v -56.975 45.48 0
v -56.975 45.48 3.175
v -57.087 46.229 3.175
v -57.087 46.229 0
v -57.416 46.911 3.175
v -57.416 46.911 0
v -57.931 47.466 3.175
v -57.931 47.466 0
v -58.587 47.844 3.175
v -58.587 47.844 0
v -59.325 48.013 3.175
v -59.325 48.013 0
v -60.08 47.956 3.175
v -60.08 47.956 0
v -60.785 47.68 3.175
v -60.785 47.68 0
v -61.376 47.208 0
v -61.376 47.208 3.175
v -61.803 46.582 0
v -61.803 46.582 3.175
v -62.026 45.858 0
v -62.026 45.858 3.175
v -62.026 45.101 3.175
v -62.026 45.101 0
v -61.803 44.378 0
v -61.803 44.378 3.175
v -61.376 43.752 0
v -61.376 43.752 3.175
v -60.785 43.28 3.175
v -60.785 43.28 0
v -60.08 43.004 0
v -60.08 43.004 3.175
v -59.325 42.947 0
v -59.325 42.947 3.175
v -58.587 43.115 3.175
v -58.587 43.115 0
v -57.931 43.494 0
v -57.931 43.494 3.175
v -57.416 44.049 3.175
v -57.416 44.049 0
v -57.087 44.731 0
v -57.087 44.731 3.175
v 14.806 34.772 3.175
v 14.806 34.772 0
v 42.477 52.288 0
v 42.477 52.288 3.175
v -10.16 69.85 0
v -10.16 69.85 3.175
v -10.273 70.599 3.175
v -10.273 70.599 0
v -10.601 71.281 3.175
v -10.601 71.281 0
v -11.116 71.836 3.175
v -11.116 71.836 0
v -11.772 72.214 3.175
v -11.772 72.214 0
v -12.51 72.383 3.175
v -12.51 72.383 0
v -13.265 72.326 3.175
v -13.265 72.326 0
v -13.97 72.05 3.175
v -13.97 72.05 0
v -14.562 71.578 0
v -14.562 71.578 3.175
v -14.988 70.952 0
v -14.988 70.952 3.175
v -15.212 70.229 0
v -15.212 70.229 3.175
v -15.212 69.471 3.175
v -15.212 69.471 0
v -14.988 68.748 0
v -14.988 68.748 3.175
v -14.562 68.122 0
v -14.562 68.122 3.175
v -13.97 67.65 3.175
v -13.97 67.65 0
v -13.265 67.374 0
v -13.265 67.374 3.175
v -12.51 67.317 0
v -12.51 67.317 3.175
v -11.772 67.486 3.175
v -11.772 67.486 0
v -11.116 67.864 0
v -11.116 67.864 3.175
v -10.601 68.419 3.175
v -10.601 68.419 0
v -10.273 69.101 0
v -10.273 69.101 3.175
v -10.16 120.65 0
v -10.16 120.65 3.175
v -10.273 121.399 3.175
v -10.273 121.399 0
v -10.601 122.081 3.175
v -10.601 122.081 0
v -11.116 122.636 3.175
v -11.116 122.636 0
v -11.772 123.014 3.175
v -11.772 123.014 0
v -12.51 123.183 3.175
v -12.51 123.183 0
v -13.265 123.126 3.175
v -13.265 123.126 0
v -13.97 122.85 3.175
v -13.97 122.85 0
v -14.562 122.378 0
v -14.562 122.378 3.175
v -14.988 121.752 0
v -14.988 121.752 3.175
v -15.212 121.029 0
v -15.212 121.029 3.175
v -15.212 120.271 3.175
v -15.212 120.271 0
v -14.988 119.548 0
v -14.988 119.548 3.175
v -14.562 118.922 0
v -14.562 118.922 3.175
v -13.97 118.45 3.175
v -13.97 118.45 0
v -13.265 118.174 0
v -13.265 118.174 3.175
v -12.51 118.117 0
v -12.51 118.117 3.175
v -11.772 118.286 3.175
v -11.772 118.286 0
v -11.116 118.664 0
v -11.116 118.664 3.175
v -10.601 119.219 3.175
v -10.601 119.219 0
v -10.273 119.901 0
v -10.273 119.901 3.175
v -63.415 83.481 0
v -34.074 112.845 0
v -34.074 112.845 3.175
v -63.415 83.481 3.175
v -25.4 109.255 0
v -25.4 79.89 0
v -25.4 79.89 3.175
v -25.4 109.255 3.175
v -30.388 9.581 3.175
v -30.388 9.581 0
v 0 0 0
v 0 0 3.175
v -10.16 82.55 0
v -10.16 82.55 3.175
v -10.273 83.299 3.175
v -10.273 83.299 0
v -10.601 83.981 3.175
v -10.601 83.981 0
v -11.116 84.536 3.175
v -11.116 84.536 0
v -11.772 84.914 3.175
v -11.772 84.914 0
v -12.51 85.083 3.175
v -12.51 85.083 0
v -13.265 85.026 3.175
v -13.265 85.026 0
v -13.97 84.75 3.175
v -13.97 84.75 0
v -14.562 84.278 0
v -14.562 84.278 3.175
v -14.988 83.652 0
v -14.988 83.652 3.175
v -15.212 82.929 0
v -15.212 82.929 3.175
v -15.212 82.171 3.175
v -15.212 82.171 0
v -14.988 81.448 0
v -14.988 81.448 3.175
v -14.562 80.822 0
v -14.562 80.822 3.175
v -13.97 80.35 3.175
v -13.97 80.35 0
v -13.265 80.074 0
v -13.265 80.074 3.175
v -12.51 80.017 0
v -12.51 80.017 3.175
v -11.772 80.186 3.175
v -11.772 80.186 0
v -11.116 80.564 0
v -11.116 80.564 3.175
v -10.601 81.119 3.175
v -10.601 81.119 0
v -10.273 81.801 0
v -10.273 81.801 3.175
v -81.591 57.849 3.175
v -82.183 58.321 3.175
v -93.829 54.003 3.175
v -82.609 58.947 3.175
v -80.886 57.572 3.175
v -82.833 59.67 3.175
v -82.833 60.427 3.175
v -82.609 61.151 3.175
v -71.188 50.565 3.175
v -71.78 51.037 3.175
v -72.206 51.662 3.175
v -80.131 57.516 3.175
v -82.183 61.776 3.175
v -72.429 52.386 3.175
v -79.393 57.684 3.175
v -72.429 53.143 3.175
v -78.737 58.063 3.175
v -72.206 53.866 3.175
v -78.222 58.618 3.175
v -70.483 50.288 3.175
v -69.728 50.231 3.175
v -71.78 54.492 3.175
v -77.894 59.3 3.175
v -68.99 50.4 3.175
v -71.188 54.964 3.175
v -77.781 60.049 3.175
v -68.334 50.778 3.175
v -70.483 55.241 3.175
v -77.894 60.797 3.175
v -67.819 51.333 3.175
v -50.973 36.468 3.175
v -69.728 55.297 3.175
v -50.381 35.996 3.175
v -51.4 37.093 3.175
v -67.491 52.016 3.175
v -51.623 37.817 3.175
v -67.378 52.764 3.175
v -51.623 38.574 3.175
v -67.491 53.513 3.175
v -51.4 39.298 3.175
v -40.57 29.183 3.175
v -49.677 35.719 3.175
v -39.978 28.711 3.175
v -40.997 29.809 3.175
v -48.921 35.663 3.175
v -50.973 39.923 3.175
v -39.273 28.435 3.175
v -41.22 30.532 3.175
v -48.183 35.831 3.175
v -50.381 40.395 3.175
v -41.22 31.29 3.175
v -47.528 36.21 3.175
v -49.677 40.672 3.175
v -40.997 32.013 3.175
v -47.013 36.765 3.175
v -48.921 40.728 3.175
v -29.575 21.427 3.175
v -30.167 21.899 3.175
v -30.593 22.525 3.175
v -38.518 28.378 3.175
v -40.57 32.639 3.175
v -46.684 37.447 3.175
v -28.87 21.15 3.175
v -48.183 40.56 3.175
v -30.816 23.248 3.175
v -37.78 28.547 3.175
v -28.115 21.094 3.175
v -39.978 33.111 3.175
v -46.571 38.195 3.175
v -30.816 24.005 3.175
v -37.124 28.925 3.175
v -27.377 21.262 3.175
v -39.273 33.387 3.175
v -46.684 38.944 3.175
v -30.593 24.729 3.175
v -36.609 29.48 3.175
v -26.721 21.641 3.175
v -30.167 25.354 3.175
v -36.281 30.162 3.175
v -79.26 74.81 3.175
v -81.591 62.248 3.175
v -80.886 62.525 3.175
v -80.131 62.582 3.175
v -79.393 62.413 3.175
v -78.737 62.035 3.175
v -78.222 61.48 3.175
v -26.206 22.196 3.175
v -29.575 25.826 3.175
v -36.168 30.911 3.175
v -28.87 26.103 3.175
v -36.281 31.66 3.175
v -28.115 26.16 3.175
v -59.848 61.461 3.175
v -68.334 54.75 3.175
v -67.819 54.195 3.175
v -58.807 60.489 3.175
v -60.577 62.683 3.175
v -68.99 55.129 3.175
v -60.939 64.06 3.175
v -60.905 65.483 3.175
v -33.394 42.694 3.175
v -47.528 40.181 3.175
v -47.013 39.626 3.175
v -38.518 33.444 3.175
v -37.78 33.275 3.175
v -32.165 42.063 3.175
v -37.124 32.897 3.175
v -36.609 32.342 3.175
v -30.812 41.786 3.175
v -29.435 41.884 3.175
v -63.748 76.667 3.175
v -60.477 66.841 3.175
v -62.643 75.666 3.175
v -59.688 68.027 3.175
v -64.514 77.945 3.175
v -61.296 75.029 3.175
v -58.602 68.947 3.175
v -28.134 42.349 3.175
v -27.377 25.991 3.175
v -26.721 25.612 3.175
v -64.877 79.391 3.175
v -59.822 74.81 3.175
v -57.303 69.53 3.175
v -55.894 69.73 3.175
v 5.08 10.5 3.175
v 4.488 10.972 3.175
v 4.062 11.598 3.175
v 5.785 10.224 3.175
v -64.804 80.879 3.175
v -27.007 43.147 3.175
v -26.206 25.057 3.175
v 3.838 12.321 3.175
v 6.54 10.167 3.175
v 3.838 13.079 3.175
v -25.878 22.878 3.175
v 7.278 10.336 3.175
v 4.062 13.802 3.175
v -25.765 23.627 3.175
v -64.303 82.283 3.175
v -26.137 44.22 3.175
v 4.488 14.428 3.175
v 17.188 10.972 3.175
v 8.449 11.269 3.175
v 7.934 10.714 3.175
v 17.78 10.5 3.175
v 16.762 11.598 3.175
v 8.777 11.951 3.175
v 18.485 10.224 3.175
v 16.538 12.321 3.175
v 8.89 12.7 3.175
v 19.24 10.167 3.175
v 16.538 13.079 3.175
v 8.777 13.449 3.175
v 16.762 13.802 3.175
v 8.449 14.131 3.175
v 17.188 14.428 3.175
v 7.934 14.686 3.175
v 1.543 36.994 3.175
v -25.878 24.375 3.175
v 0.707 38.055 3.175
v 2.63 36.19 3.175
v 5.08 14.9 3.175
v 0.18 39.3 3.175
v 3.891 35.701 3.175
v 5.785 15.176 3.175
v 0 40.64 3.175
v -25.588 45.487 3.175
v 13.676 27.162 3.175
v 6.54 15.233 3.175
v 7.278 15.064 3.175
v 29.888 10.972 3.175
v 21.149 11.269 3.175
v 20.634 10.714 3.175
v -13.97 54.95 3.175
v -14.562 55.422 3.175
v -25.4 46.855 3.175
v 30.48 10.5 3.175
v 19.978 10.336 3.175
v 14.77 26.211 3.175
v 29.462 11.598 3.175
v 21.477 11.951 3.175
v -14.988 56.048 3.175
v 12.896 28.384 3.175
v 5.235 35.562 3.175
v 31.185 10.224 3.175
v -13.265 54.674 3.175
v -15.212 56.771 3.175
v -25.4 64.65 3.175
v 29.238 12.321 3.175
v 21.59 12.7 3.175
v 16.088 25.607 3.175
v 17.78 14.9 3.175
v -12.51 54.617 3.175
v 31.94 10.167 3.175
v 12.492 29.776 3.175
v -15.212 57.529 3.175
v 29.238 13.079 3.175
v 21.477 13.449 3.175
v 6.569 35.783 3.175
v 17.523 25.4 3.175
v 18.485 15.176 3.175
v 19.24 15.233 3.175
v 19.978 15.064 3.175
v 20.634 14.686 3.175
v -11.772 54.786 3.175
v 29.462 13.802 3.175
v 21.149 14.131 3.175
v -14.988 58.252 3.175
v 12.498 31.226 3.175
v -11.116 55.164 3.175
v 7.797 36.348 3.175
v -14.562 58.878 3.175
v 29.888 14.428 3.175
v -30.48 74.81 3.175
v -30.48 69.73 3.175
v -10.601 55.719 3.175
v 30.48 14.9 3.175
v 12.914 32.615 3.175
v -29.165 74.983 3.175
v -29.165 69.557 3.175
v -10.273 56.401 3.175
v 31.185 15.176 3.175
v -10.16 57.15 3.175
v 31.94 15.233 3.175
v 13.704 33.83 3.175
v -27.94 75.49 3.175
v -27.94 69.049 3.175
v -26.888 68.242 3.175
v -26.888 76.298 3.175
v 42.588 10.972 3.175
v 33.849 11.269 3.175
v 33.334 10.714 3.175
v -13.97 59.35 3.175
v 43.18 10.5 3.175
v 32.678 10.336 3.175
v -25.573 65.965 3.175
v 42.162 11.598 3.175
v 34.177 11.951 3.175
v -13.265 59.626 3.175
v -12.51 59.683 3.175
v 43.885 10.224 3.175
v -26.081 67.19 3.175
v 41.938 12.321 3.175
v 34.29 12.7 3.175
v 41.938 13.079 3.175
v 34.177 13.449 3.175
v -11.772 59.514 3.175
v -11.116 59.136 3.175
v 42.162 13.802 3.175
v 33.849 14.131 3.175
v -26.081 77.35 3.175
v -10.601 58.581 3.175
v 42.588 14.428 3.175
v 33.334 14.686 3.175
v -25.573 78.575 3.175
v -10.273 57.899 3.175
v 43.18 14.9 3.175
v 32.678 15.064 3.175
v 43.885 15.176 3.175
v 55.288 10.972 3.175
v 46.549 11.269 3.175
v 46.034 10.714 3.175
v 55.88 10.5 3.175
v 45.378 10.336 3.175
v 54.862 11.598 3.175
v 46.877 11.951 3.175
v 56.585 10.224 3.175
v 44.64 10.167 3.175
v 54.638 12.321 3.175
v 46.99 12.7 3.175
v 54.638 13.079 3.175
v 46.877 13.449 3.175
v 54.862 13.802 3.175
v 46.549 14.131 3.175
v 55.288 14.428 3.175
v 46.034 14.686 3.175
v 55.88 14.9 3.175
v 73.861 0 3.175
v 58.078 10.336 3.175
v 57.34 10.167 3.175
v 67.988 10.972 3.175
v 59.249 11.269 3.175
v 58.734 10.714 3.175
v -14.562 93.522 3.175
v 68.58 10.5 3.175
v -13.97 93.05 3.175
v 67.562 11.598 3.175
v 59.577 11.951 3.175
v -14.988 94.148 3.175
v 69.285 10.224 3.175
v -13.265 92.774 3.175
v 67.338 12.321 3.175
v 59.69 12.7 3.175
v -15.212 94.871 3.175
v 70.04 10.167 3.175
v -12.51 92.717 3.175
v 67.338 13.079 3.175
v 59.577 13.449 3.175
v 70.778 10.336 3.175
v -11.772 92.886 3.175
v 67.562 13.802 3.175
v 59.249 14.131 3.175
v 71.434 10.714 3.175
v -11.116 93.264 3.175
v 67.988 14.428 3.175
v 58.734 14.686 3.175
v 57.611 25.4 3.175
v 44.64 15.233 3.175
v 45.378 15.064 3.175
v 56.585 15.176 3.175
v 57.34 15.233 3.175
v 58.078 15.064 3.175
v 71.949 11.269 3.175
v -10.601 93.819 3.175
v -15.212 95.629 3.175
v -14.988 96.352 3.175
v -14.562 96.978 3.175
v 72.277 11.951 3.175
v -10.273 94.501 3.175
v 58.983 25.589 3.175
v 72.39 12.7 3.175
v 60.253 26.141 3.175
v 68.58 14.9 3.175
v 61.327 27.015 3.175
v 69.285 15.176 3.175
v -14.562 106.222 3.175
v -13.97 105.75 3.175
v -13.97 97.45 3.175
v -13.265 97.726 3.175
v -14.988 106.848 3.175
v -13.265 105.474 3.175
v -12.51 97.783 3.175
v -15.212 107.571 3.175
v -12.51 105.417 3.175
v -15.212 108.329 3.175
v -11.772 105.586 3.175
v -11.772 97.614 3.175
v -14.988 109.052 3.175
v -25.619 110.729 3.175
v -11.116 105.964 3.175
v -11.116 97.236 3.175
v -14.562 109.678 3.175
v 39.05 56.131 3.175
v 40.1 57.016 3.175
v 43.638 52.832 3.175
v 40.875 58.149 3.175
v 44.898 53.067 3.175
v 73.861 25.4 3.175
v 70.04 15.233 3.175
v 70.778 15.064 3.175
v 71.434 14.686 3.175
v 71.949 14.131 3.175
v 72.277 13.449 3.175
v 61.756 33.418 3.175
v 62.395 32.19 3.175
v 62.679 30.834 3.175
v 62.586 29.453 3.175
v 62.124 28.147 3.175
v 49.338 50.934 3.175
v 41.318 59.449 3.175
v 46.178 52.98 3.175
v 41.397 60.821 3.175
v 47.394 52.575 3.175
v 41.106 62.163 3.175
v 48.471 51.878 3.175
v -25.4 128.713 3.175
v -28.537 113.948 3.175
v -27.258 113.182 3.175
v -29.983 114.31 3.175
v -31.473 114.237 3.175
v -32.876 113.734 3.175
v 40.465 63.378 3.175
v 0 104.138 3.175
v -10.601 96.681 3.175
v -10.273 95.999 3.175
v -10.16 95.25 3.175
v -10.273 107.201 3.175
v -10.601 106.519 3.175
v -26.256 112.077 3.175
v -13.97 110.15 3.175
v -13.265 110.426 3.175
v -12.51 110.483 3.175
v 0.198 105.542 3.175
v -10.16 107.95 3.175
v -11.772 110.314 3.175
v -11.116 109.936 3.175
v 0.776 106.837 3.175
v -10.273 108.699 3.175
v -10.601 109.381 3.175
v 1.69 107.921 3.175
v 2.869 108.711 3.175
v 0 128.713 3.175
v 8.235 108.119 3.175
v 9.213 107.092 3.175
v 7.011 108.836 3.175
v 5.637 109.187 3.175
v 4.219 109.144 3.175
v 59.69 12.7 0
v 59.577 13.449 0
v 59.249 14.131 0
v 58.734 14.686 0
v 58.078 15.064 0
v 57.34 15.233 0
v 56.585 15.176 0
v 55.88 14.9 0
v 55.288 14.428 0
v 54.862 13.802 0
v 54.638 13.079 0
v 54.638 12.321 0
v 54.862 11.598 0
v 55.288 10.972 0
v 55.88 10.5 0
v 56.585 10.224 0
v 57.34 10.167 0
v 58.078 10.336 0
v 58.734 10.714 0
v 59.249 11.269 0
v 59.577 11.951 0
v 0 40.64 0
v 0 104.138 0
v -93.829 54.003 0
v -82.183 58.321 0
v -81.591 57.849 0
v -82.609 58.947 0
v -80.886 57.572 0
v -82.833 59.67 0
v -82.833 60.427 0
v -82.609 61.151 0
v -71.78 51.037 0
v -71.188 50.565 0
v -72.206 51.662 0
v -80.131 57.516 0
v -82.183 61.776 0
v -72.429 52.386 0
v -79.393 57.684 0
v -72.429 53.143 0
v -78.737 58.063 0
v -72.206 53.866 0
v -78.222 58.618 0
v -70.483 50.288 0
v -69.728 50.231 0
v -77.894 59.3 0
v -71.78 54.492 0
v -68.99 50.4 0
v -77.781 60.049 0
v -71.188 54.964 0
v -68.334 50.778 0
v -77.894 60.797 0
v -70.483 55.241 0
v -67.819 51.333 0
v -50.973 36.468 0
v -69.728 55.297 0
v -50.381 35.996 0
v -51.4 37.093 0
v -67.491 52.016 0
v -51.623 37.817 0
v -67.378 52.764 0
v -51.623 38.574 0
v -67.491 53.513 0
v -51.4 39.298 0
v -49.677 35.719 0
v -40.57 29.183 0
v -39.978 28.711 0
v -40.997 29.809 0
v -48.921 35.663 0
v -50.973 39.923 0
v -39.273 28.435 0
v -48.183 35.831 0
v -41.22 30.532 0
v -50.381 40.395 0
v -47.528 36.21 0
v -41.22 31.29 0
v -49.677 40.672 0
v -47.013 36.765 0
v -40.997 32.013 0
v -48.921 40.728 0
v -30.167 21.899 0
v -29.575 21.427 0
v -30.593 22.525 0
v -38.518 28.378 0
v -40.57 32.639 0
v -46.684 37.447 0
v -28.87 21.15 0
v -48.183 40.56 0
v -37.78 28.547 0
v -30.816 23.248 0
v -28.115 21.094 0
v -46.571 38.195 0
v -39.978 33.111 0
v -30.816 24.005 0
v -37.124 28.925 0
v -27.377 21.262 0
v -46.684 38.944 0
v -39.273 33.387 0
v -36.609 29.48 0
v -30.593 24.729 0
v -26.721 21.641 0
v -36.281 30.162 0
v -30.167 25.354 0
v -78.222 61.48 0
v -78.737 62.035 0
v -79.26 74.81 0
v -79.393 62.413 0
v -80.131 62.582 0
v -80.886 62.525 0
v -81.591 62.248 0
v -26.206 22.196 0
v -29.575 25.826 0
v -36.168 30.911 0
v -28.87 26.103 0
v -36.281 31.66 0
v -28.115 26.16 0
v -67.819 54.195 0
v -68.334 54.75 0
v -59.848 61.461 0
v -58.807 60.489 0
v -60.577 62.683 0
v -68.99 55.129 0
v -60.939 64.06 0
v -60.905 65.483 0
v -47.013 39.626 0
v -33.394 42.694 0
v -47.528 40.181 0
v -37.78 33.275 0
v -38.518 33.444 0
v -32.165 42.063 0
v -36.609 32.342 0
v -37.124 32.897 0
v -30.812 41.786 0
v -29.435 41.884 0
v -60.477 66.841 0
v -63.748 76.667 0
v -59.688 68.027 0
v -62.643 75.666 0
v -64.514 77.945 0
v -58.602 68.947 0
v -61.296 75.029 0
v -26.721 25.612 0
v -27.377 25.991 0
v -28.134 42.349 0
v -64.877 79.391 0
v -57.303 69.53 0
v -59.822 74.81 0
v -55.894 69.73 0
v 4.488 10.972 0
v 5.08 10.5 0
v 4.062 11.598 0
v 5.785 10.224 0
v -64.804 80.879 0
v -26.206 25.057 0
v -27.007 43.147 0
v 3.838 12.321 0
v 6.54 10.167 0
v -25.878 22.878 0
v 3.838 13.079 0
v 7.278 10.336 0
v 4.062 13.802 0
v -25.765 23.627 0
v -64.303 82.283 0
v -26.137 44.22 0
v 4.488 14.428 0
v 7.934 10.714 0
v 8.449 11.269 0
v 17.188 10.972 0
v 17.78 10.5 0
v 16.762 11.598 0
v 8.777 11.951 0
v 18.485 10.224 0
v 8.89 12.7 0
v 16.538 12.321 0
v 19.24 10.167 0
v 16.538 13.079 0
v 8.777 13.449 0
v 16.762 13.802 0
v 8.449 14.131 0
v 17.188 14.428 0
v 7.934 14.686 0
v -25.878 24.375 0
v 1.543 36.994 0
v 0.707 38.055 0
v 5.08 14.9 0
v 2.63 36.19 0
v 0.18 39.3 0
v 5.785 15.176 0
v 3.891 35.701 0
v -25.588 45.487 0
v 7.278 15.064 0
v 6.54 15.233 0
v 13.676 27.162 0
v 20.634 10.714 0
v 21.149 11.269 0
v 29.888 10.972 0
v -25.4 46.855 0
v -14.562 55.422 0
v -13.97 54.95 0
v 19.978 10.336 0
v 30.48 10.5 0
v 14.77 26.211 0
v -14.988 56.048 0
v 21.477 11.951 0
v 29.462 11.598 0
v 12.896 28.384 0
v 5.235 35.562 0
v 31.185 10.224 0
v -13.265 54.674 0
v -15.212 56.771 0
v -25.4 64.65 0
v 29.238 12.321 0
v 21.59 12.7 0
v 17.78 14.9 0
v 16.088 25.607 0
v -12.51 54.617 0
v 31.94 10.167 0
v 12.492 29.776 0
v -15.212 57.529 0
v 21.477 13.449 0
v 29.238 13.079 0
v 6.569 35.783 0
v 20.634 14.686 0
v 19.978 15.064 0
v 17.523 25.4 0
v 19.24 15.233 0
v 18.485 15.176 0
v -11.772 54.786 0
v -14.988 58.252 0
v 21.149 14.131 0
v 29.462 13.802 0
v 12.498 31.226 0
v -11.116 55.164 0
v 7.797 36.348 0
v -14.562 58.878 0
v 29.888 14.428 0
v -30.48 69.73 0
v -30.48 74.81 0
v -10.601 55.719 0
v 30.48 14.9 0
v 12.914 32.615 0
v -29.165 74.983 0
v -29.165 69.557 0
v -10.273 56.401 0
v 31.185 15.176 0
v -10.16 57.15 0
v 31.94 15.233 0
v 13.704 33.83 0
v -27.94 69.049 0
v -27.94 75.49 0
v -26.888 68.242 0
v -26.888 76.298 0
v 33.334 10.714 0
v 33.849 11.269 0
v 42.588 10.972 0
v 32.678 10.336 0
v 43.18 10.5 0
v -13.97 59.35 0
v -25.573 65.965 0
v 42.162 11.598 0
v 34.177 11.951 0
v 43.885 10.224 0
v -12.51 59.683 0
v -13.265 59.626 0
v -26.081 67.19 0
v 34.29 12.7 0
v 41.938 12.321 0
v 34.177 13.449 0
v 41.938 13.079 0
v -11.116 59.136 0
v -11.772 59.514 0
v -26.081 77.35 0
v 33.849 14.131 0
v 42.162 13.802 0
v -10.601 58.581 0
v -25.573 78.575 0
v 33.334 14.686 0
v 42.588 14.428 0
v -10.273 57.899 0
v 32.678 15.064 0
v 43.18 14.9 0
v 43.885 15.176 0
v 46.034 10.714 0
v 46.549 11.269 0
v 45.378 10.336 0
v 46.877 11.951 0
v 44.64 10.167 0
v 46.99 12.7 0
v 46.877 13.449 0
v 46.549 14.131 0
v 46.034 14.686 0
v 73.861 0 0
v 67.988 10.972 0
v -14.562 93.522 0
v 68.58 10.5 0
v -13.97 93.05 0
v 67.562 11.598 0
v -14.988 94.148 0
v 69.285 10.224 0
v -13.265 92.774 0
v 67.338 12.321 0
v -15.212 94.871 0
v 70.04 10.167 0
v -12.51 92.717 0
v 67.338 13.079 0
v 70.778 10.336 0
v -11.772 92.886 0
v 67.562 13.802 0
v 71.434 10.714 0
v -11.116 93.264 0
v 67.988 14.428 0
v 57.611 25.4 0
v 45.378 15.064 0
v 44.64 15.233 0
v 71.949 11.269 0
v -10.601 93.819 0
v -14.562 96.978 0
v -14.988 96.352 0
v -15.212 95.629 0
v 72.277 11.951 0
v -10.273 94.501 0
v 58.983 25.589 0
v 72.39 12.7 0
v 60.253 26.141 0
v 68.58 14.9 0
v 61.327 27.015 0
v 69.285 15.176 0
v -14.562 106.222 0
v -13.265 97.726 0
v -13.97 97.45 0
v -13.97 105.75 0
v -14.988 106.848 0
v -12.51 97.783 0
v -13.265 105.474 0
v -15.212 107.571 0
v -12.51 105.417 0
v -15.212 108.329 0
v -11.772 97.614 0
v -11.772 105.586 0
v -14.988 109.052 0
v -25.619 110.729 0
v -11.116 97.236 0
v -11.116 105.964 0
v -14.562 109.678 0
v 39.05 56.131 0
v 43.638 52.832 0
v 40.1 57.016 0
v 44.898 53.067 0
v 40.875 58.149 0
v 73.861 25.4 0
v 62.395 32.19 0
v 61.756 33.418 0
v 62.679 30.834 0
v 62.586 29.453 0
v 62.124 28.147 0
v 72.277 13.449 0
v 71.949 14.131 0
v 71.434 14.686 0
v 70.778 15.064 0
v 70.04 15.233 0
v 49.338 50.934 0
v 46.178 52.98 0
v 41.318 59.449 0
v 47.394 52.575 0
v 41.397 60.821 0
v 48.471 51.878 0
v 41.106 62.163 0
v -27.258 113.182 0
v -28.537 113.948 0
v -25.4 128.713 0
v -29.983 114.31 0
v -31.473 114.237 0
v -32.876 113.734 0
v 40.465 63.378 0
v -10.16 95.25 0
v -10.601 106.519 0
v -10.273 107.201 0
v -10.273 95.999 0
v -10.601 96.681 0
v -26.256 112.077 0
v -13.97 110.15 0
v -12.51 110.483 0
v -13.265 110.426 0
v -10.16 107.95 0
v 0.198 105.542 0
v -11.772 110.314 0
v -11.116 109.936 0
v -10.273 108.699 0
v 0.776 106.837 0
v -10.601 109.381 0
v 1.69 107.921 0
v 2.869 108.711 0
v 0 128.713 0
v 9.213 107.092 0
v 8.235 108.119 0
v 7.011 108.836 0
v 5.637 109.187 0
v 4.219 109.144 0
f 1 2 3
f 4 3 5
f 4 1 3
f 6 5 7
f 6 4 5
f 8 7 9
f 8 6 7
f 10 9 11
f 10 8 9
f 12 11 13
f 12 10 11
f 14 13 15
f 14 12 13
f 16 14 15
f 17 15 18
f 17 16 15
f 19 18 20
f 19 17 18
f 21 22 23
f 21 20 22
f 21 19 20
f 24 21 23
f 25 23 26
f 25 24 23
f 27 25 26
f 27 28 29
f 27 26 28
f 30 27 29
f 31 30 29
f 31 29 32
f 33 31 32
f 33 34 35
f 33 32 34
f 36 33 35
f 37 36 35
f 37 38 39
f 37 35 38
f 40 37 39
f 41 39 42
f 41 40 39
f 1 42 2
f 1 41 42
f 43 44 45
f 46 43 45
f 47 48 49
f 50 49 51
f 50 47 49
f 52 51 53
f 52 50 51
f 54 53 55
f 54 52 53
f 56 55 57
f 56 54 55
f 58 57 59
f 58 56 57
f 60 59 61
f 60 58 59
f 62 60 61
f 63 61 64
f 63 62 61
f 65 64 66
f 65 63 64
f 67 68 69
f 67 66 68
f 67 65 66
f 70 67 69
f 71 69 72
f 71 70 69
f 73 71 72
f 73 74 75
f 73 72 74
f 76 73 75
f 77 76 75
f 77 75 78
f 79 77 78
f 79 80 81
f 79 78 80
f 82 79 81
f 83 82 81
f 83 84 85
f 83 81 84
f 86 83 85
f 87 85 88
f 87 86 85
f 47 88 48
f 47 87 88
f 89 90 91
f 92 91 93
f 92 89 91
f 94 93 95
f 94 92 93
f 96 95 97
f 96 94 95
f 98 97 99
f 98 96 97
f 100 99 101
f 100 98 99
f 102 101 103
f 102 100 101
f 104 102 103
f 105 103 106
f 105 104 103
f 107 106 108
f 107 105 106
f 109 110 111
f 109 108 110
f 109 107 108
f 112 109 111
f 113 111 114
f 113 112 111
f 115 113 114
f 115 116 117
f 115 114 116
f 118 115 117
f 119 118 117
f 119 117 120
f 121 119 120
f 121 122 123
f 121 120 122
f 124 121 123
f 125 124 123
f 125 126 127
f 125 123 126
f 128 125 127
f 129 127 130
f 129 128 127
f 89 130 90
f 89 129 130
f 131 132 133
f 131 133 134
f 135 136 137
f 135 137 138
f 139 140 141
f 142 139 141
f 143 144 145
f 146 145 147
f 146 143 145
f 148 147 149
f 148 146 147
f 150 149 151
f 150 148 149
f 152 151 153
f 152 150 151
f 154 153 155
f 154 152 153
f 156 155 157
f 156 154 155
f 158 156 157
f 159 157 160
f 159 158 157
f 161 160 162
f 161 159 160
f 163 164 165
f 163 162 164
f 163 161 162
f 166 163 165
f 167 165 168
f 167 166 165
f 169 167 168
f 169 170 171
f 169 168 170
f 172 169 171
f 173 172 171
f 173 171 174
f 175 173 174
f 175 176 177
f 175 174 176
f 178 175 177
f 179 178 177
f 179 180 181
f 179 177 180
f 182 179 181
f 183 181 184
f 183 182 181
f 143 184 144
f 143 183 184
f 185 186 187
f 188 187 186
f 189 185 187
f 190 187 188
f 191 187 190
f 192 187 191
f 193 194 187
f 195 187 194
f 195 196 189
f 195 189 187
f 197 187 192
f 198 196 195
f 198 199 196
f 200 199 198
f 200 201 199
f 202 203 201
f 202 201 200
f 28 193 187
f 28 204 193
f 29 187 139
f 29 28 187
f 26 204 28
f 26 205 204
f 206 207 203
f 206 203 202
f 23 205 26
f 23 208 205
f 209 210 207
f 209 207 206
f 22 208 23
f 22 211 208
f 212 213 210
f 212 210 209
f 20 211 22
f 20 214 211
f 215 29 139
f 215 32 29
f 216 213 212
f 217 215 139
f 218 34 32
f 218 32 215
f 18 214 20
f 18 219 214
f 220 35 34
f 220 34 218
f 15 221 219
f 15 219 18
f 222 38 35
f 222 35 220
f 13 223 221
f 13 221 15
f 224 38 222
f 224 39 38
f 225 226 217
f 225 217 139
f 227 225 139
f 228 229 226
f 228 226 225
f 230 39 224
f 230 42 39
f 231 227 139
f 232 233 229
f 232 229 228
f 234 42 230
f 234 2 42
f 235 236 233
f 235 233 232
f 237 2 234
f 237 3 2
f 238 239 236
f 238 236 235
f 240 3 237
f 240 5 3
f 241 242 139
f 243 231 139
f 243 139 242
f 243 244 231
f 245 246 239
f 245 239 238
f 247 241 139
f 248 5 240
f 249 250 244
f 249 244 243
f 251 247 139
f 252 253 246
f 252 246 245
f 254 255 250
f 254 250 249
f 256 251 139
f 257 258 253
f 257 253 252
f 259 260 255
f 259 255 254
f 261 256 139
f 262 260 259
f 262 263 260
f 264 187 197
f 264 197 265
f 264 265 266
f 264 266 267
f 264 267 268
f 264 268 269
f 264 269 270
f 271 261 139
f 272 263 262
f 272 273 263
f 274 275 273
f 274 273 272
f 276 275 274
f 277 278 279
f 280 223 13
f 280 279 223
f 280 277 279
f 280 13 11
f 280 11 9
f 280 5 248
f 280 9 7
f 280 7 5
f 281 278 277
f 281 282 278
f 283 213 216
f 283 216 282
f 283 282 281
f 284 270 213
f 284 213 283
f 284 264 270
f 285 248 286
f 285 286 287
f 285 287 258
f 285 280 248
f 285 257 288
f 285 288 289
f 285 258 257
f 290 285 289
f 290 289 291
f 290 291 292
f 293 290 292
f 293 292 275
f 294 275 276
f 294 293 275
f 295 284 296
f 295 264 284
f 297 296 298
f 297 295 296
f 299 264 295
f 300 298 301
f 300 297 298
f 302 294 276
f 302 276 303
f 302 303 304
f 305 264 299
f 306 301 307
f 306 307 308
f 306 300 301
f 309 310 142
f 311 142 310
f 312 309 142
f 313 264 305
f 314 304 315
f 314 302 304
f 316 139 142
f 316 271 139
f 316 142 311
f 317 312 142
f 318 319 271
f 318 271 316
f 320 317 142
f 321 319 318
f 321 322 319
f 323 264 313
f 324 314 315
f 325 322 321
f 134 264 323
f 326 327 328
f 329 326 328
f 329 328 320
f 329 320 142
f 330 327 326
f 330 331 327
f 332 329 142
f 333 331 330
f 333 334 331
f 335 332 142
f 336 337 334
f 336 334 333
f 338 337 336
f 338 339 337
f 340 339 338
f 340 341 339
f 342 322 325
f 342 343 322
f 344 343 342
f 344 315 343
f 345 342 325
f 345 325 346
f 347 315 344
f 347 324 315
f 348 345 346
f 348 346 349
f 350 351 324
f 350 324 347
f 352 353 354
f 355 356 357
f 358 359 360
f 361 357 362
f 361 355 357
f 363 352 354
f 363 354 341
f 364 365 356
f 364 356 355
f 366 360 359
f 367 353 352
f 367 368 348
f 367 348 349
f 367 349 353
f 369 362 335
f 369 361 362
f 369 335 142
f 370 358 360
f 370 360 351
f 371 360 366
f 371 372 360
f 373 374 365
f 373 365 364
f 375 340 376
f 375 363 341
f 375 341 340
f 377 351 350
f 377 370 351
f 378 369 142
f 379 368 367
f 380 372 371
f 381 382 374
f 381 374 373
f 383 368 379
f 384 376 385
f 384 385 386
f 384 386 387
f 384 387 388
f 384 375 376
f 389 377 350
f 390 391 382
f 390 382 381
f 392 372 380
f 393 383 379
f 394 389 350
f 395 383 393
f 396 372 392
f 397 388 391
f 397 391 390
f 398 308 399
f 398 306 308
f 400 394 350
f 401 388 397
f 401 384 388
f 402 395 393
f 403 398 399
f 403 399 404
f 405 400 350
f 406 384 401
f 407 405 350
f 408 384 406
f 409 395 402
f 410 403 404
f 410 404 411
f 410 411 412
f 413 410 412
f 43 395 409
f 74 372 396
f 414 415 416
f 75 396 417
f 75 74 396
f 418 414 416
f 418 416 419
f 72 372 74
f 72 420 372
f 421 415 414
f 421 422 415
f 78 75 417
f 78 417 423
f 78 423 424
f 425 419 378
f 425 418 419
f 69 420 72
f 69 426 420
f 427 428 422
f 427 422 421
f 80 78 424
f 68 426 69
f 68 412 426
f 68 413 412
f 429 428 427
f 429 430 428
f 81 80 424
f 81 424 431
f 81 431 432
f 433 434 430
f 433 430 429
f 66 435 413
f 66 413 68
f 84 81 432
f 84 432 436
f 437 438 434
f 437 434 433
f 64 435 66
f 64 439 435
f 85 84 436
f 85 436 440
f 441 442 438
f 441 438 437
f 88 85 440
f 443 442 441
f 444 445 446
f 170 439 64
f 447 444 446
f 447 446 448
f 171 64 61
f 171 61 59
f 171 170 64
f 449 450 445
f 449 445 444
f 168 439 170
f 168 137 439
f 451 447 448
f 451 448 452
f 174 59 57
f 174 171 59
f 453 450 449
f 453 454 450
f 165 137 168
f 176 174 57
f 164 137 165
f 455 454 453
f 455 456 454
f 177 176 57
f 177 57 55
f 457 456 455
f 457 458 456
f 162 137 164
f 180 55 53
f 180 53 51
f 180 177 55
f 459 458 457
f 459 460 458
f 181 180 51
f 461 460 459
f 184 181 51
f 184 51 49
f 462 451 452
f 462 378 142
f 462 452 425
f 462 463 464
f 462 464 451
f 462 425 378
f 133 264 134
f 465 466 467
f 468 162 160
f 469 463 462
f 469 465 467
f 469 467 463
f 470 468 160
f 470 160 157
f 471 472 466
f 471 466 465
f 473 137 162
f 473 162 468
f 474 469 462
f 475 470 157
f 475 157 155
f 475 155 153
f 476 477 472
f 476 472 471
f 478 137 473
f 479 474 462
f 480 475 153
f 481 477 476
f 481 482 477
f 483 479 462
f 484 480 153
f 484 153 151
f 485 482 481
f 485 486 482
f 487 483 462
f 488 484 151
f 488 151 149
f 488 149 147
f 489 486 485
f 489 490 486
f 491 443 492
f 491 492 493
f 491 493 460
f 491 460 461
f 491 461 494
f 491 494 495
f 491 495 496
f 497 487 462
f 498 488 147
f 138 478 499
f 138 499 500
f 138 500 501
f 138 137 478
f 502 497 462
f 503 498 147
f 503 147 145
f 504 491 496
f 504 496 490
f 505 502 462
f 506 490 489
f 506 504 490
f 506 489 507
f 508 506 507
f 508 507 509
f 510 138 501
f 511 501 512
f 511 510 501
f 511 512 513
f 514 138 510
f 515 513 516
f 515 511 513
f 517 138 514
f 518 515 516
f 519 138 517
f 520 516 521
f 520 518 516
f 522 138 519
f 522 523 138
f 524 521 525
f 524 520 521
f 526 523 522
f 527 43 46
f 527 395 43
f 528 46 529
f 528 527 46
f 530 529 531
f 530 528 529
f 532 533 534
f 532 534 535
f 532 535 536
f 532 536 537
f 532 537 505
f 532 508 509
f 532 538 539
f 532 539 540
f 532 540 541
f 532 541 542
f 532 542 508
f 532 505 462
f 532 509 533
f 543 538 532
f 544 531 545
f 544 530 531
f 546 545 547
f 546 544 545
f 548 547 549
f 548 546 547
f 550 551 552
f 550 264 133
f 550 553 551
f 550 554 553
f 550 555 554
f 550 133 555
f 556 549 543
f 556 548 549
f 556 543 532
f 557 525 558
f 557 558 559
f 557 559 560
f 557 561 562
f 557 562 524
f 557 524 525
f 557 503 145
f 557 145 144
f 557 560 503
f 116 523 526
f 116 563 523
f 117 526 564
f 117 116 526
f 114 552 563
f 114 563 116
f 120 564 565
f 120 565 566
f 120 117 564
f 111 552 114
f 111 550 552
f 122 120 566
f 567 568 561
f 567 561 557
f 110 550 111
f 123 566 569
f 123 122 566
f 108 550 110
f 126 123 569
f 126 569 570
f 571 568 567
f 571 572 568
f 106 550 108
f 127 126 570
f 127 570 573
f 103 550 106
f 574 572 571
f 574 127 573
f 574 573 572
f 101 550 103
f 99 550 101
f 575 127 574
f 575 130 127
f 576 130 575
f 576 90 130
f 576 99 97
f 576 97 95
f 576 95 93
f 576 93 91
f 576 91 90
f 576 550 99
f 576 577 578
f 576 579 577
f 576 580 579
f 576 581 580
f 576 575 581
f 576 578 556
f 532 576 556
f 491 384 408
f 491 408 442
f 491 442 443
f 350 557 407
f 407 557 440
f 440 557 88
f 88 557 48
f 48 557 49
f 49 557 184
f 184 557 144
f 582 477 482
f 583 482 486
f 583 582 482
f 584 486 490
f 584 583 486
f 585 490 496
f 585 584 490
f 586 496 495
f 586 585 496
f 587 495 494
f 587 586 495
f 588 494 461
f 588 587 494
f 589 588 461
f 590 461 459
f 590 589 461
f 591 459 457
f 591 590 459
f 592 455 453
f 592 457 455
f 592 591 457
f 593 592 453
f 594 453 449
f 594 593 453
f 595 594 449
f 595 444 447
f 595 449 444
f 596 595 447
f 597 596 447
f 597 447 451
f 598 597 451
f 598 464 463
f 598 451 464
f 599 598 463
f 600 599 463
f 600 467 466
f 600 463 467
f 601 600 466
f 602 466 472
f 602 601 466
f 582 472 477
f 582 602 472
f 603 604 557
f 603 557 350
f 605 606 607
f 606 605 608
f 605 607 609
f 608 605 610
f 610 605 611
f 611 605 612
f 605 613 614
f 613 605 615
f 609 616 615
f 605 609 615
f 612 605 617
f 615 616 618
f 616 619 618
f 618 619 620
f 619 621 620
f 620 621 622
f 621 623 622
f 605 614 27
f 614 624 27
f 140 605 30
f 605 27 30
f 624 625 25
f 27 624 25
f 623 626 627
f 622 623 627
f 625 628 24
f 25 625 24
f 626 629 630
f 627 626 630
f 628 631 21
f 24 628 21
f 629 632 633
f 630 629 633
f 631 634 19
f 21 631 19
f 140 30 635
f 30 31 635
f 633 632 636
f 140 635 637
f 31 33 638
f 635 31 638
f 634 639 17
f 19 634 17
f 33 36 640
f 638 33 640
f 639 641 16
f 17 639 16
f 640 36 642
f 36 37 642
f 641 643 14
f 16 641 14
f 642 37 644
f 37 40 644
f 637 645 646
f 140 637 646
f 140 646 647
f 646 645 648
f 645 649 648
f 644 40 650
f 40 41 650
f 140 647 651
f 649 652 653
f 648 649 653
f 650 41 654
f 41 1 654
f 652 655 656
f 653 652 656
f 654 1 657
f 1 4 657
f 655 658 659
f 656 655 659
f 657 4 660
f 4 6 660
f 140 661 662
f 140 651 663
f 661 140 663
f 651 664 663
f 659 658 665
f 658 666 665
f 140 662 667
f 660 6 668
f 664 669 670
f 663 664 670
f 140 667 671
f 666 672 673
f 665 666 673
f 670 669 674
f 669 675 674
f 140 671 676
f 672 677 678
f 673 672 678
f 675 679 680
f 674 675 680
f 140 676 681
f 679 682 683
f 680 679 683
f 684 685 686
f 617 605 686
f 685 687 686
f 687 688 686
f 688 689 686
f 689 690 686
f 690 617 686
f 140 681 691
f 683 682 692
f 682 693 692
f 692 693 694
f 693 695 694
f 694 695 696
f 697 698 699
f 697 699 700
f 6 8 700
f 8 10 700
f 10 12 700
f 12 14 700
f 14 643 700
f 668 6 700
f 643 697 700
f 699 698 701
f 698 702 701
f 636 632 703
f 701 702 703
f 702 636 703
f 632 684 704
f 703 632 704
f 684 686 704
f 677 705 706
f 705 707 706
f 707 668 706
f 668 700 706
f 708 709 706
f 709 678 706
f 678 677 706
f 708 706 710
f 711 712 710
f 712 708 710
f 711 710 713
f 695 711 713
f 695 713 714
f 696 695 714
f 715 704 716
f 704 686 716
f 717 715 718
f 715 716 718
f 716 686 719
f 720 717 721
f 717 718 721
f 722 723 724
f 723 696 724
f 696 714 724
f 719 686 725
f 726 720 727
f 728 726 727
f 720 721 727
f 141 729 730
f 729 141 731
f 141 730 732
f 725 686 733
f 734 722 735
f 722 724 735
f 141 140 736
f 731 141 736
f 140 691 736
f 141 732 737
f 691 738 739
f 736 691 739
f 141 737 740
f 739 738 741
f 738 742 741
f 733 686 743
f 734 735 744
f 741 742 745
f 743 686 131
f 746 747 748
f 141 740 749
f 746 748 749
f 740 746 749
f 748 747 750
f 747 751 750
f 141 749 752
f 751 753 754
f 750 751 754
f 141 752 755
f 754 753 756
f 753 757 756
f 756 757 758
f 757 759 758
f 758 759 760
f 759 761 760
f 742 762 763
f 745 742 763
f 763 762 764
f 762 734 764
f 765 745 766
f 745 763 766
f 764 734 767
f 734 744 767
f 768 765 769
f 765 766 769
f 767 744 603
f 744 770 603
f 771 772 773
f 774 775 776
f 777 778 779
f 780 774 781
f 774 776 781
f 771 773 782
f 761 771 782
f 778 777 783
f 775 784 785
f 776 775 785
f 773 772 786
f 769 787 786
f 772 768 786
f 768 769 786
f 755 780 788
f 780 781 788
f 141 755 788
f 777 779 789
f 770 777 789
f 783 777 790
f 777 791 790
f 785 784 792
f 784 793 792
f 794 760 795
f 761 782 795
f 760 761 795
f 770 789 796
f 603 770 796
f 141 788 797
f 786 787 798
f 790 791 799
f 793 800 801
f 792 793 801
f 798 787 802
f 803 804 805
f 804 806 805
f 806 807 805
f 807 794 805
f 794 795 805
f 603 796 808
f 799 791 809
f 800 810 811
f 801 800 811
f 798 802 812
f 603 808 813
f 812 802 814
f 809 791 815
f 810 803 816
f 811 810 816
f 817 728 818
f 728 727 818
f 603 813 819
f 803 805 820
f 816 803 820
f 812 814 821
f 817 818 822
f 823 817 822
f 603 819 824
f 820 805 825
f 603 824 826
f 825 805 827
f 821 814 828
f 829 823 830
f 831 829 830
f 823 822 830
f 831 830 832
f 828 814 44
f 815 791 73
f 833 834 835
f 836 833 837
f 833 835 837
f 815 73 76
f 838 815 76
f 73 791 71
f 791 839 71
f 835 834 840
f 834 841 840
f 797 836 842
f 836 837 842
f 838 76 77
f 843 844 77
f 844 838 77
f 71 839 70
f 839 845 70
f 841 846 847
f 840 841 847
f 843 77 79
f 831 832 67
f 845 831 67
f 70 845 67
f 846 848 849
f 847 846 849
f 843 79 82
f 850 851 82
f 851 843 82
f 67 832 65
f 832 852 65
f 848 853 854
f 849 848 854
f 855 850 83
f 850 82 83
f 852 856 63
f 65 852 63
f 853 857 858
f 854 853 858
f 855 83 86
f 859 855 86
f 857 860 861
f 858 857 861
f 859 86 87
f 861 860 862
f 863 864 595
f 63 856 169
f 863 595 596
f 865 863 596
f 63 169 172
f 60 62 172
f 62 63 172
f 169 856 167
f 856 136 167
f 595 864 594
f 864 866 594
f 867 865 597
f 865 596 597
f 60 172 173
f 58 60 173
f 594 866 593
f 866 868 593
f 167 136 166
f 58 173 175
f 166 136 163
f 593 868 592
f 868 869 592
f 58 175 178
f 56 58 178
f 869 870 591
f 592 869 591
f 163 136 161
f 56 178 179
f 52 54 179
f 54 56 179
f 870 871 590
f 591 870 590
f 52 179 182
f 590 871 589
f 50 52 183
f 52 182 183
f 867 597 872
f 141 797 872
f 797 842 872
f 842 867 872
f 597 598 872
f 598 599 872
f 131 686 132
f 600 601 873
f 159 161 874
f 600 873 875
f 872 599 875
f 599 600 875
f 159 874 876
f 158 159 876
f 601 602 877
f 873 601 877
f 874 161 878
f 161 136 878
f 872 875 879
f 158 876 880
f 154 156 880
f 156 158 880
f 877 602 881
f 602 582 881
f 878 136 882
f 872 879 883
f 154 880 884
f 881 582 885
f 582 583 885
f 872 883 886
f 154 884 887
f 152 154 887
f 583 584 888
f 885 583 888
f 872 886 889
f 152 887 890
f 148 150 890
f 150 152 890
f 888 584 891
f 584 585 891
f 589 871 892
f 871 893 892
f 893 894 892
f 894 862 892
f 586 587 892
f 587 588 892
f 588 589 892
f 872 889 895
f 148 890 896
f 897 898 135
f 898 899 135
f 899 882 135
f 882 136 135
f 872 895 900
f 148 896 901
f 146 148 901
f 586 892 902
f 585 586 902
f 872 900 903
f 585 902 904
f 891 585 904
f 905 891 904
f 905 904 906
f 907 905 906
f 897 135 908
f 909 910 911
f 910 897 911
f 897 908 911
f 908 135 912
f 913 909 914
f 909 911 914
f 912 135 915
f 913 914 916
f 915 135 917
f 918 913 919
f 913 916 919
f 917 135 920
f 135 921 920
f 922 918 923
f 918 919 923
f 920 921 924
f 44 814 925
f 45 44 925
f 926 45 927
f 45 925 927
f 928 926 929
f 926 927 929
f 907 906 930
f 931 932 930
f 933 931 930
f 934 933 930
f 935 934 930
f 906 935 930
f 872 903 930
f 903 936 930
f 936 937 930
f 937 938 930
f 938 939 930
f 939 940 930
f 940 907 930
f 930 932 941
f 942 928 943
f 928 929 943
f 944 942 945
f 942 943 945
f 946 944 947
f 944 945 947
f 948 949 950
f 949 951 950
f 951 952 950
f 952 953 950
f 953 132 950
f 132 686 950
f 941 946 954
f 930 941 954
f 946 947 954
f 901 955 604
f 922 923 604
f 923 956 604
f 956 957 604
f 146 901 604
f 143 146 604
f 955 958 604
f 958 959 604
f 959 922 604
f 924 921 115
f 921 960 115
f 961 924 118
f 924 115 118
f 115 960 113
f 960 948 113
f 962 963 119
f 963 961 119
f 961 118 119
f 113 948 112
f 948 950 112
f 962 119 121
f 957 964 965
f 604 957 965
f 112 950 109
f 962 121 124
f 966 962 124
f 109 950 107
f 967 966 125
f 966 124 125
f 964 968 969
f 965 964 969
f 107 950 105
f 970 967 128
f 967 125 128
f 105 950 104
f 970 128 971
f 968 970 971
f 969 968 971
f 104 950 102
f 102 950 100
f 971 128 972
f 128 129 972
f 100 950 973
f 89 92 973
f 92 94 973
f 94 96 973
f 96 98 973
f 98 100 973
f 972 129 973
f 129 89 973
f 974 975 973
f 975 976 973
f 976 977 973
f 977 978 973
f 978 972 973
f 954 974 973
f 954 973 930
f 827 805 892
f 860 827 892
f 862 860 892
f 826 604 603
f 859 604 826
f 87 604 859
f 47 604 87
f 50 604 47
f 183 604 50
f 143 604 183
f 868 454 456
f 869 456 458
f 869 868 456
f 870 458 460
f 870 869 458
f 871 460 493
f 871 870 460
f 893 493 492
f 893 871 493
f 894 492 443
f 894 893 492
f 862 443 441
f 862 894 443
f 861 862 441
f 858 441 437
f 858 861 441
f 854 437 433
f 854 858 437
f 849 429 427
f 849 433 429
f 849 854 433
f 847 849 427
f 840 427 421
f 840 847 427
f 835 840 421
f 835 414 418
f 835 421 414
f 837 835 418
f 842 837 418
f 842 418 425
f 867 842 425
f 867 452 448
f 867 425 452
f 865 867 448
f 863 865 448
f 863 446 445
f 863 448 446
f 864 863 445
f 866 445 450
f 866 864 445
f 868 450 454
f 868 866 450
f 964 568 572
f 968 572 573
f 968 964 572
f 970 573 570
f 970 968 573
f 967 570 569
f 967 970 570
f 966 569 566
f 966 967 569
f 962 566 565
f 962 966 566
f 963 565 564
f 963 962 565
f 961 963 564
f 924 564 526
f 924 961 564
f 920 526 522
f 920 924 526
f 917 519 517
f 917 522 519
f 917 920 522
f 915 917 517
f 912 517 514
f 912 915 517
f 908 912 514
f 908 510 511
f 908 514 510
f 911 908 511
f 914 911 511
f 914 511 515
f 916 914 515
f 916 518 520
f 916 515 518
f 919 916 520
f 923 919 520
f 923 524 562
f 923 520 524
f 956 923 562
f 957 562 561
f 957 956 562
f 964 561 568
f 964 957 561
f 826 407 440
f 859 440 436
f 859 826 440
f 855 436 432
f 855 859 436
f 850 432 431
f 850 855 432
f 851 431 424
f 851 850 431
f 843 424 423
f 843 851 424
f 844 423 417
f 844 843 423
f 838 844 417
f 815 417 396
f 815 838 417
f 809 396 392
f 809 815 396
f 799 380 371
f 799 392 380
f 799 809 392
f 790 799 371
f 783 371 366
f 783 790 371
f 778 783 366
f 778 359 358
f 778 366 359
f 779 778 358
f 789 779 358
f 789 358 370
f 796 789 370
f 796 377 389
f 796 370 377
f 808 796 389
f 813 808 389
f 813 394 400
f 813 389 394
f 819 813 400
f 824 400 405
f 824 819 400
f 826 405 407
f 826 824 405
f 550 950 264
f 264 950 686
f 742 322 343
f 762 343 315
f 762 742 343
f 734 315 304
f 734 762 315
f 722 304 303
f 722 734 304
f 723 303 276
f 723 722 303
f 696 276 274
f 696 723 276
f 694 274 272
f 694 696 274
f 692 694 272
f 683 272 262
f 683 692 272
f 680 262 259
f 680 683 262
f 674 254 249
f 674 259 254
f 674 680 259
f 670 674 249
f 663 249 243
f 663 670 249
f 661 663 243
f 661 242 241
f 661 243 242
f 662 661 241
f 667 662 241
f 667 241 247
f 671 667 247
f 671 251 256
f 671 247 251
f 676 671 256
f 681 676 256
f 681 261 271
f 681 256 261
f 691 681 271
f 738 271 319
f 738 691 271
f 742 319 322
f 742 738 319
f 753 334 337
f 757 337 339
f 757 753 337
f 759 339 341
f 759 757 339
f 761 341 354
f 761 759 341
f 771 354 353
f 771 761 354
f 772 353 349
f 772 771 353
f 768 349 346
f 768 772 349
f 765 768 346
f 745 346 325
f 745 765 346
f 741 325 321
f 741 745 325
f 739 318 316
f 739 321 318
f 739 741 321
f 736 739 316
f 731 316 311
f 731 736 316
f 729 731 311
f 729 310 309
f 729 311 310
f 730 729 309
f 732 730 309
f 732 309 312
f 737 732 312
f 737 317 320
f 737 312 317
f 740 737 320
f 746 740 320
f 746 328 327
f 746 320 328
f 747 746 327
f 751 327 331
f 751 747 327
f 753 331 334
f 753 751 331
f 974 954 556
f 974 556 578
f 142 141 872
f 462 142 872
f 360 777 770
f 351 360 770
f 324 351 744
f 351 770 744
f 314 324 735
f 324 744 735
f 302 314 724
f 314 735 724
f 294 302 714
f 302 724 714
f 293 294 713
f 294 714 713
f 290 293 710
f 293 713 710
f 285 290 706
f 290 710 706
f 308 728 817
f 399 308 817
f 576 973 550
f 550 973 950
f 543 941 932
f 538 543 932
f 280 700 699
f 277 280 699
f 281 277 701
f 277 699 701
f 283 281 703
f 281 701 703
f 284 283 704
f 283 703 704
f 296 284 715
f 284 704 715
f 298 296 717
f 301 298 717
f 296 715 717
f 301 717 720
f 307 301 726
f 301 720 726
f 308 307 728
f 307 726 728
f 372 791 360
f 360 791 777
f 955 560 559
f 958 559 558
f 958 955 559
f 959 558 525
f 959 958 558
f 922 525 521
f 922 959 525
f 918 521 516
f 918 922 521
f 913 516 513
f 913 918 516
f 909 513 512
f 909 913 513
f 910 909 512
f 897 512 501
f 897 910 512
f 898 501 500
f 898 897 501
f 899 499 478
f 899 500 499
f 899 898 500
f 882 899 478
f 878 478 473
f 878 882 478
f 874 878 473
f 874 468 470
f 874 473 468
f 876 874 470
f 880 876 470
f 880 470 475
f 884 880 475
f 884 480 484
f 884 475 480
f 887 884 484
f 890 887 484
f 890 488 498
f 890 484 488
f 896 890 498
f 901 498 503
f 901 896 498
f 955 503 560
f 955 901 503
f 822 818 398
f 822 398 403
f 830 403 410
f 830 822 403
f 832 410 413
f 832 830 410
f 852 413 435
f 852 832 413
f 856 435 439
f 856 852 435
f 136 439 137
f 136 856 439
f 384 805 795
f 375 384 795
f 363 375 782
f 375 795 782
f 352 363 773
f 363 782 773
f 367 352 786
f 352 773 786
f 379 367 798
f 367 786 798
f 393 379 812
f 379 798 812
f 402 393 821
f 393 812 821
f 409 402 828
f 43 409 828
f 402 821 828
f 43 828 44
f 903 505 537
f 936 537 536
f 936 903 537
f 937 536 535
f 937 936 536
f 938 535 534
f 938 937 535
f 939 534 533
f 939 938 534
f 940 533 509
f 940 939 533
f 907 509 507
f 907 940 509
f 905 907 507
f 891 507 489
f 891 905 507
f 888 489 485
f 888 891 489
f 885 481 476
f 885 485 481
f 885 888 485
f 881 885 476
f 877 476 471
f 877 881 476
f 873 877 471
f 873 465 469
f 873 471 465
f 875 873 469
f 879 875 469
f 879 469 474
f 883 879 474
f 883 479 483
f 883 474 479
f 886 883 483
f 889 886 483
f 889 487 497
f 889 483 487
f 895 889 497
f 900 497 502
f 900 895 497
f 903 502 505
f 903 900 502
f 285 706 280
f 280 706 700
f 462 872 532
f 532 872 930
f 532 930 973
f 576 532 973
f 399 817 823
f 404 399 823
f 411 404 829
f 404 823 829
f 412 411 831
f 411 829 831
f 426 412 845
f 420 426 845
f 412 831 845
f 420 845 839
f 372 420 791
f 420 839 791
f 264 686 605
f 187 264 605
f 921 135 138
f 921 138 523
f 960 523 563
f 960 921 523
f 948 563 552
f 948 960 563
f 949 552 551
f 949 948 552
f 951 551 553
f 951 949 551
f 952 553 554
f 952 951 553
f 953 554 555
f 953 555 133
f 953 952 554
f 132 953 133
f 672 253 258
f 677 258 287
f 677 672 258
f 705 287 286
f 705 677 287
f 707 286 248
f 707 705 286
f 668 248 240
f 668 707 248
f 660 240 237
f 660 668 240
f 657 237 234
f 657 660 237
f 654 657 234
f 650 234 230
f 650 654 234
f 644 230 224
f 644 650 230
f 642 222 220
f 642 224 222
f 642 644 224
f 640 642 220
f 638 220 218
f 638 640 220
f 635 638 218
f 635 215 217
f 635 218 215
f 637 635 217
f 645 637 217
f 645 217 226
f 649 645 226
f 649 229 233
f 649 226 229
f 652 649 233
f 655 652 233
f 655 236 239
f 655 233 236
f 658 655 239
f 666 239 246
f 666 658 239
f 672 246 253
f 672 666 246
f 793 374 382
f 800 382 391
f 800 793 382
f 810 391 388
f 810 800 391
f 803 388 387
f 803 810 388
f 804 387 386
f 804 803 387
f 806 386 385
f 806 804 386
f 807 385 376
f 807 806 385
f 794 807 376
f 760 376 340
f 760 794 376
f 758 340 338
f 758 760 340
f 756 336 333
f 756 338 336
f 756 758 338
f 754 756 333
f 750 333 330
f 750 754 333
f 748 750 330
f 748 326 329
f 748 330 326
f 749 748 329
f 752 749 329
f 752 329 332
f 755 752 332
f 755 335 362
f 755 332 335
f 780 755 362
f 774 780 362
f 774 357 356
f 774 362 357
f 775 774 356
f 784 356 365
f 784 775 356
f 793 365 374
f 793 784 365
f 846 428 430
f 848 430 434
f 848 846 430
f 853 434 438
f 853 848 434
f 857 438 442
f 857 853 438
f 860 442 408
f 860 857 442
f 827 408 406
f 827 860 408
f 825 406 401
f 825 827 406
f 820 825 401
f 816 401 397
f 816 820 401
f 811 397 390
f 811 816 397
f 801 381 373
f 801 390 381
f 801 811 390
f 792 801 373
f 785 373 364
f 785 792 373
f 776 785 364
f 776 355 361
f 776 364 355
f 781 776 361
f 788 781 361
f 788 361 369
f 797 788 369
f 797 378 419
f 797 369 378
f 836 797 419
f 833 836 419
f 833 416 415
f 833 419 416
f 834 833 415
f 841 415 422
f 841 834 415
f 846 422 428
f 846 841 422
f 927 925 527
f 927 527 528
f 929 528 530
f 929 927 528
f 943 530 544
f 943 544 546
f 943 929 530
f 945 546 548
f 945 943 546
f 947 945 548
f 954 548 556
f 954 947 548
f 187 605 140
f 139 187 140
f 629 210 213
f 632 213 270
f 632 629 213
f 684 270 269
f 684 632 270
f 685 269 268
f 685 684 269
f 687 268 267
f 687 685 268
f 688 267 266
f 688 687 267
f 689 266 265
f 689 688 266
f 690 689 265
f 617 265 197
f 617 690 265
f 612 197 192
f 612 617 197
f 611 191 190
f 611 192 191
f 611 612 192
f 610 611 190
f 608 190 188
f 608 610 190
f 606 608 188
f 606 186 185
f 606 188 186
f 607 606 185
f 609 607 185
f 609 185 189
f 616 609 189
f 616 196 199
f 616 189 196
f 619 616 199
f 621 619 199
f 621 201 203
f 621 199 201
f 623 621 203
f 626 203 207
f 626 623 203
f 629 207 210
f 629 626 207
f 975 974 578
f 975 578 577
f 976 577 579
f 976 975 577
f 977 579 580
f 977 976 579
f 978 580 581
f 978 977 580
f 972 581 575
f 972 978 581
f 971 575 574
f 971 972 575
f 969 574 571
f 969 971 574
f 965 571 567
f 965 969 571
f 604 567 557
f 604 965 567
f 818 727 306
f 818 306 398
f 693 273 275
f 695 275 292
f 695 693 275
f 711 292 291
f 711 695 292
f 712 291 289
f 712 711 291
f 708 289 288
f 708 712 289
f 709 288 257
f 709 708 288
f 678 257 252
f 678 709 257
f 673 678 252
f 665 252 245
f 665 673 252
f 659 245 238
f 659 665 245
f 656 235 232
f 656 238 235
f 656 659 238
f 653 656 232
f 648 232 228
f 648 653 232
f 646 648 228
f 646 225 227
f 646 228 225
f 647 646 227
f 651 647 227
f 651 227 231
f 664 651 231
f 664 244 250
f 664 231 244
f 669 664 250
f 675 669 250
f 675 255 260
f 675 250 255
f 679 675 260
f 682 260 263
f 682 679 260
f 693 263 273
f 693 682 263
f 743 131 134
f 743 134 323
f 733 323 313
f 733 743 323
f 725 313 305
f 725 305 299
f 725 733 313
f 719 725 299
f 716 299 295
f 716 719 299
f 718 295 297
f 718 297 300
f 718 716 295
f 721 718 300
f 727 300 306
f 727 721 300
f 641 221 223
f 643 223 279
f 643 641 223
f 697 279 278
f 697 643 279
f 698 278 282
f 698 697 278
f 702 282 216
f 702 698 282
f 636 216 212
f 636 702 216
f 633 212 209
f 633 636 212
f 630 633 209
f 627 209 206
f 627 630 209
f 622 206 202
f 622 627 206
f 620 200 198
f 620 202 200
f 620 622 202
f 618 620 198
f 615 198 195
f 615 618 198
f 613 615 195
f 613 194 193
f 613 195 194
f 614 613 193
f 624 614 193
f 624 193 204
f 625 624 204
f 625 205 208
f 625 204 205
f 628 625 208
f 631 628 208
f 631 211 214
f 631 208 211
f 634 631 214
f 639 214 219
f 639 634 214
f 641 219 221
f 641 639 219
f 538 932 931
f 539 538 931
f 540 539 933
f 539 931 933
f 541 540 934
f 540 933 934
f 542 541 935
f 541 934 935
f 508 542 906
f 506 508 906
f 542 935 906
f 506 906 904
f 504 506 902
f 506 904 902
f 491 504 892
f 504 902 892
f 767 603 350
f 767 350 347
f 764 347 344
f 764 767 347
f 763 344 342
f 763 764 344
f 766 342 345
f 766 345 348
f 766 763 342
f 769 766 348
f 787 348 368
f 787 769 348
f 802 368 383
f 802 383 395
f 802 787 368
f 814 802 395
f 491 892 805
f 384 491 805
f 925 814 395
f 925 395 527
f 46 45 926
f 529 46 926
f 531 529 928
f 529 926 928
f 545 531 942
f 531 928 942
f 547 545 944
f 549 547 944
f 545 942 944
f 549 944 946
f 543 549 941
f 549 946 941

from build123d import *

# Parameters (mm, degrees)
BOSS_EXTRUDE1_DEPTH     = 3.175
SKETCH3_R               = 2.54
CUT_EXTRUDE4_DEPTH      = 4.175
CUT_EXTRUDE4_DEPTH_BACK = 1


with BuildPart() as part:
    # Sketch2 → Boss-Extrude1 (new body)
    with BuildSketch(Plane.XY):
        Polygon((-79.260302653, 74.809862941), (-93.829144137, 54.003401016), (-30.387651704, 9.581189779), (0, 0), (73.861366343, 0), (73.861366343, 25.4), (0, 128.712625375), (-25.4, 128.712625375), align=None)
        with BuildLine():
            Line((-59.82155239, 74.809862941), (-30.48, 74.809862941))
            ThreePointArc((-30.48, 74.809862941), (-26.887897552, 76.297760492), (-25.4, 79.889862941))
            Line((-25.4, 79.889862941), (-25.4, 109.254546205))
            ThreePointArc((-25.4, 109.254546205), (-28.536892808, 113.948237124), (-34.073517496, 112.845233049))
            Line((-34.073517496, 112.845233049), (-63.415069886, 83.480549784))
            ThreePointArc((-63.415069886, 83.480549784), (-64.51447734, 77.944906536), (-59.82155239, 74.809862941))
        make_face(mode=Mode.SUBTRACT)
        with BuildLine():
            Line((-55.893609183, 69.729862941), (-30.48, 69.729862941))
            ThreePointArc((-30.48, 69.729862941), (-26.887897552, 68.241965389), (-25.4, 64.649862941))
            Line((-25.4, 64.649862941), (-25.4, 46.855062218))
            ThreePointArc((-25.4, 46.855062218), (-28.134317045, 42.349047185), (-33.393768297, 42.693769833))
            Line((-33.393768297, 42.693769833), (-58.80737748, 60.488570556))
            ThreePointArc((-58.80737748, 60.488570556), (-60.738491293, 66.177448402), (-55.893609183, 69.729862941))
        make_face(mode=Mode.SUBTRACT)
        with BuildLine():
            Line((7.797059491, 36.347810077), (39.049758479, 56.13093342))
            ThreePointArc((39.049758479, 56.13093342), (41.318484722, 59.449422894), (40.465204003, 63.377705364))
            Line((40.465204003, 63.377705364), (9.212505015, 107.092011536))
            ThreePointArc((9.212505015, 107.092011536), (3.528665973, 108.974887007), (0, 104.137556882))
            Line((0, 104.137556882), (0, 40.640127367))
            ThreePointArc((0, 40.640127367), (2.630128801, 36.189899159), (7.797059491, 36.347810077))
        make_face(mode=Mode.SUBTRACT)
        with BuildLine():
            Line((14.80606505, 34.772317291), (42.476873448, 52.288084993))
            ThreePointArc((42.476873448, 52.288084993), (46.177688514, 52.979604073), (49.338173329, 50.93373836))
            Line((49.338173329, 50.93373836), (61.755602511, 33.417970658))
            ThreePointArc((61.755602511, 33.417970658), (62.124193324, 28.147457497), (57.61136212, 25.4))
            Line((57.61136212, 25.4), (17.52312454, 25.4))
            ThreePointArc((17.52312454, 25.4), (12.644017458, 29.065533994), (14.80606505, 34.772317291))
        make_face(mode=Mode.SUBTRACT)
    extrude(amount=BOSS_EXTRUDE1_DEPTH)

    # Sketch3 → Cut-Extrude4 (cut, two sides)
    with BuildSketch(Plane.XY) as cut_extrude4_sk:
        with Locations((-12.7, 57.15)):
            Circle(SKETCH3_R)
        with Locations((6.35, 12.7)):
            Circle(SKETCH3_R)
        with Locations((-28.304846444, 23.626631112)):
            Circle(SKETCH3_R)
        with Locations((-38.708077406, 30.911051854)):
            Circle(SKETCH3_R)
        with Locations((-49.111308369, 38.195472596)):
            Circle(SKETCH3_R)
        with Locations((-59.514539331, 45.479893337)):
            Circle(SKETCH3_R)
        with Locations((-69.917770294, 52.764314079)):
            Circle(SKETCH3_R)
        with Locations((-80.321001256, 60.048734821)):
            Circle(SKETCH3_R)
        with Locations((-12.7, 69.85)):
            Circle(SKETCH3_R)
        with Locations((-12.7, 82.55)):
            Circle(SKETCH3_R)
        with Locations((-12.7, 95.25)):
            Circle(SKETCH3_R)
        with Locations((-12.7, 107.95)):
            Circle(SKETCH3_R)
        with Locations((-12.7, 120.65)):
            Circle(SKETCH3_R)
        with Locations((19.05, 12.7)):
            Circle(SKETCH3_R)
        with Locations((31.75, 12.7)):
            Circle(SKETCH3_R)
        with Locations((44.45, 12.7)):
            Circle(SKETCH3_R)
        with Locations((57.15, 12.7)):
            Circle(SKETCH3_R)
        with Locations((69.85, 12.7)):
            Circle(SKETCH3_R)
    extrude(amount=CUT_EXTRUDE4_DEPTH, mode=Mode.SUBTRACT)
    extrude(cut_extrude4_sk.sketch, amount=-CUT_EXTRUDE4_DEPTH_BACK, mode=Mode.SUBTRACT)


solid = part.part
